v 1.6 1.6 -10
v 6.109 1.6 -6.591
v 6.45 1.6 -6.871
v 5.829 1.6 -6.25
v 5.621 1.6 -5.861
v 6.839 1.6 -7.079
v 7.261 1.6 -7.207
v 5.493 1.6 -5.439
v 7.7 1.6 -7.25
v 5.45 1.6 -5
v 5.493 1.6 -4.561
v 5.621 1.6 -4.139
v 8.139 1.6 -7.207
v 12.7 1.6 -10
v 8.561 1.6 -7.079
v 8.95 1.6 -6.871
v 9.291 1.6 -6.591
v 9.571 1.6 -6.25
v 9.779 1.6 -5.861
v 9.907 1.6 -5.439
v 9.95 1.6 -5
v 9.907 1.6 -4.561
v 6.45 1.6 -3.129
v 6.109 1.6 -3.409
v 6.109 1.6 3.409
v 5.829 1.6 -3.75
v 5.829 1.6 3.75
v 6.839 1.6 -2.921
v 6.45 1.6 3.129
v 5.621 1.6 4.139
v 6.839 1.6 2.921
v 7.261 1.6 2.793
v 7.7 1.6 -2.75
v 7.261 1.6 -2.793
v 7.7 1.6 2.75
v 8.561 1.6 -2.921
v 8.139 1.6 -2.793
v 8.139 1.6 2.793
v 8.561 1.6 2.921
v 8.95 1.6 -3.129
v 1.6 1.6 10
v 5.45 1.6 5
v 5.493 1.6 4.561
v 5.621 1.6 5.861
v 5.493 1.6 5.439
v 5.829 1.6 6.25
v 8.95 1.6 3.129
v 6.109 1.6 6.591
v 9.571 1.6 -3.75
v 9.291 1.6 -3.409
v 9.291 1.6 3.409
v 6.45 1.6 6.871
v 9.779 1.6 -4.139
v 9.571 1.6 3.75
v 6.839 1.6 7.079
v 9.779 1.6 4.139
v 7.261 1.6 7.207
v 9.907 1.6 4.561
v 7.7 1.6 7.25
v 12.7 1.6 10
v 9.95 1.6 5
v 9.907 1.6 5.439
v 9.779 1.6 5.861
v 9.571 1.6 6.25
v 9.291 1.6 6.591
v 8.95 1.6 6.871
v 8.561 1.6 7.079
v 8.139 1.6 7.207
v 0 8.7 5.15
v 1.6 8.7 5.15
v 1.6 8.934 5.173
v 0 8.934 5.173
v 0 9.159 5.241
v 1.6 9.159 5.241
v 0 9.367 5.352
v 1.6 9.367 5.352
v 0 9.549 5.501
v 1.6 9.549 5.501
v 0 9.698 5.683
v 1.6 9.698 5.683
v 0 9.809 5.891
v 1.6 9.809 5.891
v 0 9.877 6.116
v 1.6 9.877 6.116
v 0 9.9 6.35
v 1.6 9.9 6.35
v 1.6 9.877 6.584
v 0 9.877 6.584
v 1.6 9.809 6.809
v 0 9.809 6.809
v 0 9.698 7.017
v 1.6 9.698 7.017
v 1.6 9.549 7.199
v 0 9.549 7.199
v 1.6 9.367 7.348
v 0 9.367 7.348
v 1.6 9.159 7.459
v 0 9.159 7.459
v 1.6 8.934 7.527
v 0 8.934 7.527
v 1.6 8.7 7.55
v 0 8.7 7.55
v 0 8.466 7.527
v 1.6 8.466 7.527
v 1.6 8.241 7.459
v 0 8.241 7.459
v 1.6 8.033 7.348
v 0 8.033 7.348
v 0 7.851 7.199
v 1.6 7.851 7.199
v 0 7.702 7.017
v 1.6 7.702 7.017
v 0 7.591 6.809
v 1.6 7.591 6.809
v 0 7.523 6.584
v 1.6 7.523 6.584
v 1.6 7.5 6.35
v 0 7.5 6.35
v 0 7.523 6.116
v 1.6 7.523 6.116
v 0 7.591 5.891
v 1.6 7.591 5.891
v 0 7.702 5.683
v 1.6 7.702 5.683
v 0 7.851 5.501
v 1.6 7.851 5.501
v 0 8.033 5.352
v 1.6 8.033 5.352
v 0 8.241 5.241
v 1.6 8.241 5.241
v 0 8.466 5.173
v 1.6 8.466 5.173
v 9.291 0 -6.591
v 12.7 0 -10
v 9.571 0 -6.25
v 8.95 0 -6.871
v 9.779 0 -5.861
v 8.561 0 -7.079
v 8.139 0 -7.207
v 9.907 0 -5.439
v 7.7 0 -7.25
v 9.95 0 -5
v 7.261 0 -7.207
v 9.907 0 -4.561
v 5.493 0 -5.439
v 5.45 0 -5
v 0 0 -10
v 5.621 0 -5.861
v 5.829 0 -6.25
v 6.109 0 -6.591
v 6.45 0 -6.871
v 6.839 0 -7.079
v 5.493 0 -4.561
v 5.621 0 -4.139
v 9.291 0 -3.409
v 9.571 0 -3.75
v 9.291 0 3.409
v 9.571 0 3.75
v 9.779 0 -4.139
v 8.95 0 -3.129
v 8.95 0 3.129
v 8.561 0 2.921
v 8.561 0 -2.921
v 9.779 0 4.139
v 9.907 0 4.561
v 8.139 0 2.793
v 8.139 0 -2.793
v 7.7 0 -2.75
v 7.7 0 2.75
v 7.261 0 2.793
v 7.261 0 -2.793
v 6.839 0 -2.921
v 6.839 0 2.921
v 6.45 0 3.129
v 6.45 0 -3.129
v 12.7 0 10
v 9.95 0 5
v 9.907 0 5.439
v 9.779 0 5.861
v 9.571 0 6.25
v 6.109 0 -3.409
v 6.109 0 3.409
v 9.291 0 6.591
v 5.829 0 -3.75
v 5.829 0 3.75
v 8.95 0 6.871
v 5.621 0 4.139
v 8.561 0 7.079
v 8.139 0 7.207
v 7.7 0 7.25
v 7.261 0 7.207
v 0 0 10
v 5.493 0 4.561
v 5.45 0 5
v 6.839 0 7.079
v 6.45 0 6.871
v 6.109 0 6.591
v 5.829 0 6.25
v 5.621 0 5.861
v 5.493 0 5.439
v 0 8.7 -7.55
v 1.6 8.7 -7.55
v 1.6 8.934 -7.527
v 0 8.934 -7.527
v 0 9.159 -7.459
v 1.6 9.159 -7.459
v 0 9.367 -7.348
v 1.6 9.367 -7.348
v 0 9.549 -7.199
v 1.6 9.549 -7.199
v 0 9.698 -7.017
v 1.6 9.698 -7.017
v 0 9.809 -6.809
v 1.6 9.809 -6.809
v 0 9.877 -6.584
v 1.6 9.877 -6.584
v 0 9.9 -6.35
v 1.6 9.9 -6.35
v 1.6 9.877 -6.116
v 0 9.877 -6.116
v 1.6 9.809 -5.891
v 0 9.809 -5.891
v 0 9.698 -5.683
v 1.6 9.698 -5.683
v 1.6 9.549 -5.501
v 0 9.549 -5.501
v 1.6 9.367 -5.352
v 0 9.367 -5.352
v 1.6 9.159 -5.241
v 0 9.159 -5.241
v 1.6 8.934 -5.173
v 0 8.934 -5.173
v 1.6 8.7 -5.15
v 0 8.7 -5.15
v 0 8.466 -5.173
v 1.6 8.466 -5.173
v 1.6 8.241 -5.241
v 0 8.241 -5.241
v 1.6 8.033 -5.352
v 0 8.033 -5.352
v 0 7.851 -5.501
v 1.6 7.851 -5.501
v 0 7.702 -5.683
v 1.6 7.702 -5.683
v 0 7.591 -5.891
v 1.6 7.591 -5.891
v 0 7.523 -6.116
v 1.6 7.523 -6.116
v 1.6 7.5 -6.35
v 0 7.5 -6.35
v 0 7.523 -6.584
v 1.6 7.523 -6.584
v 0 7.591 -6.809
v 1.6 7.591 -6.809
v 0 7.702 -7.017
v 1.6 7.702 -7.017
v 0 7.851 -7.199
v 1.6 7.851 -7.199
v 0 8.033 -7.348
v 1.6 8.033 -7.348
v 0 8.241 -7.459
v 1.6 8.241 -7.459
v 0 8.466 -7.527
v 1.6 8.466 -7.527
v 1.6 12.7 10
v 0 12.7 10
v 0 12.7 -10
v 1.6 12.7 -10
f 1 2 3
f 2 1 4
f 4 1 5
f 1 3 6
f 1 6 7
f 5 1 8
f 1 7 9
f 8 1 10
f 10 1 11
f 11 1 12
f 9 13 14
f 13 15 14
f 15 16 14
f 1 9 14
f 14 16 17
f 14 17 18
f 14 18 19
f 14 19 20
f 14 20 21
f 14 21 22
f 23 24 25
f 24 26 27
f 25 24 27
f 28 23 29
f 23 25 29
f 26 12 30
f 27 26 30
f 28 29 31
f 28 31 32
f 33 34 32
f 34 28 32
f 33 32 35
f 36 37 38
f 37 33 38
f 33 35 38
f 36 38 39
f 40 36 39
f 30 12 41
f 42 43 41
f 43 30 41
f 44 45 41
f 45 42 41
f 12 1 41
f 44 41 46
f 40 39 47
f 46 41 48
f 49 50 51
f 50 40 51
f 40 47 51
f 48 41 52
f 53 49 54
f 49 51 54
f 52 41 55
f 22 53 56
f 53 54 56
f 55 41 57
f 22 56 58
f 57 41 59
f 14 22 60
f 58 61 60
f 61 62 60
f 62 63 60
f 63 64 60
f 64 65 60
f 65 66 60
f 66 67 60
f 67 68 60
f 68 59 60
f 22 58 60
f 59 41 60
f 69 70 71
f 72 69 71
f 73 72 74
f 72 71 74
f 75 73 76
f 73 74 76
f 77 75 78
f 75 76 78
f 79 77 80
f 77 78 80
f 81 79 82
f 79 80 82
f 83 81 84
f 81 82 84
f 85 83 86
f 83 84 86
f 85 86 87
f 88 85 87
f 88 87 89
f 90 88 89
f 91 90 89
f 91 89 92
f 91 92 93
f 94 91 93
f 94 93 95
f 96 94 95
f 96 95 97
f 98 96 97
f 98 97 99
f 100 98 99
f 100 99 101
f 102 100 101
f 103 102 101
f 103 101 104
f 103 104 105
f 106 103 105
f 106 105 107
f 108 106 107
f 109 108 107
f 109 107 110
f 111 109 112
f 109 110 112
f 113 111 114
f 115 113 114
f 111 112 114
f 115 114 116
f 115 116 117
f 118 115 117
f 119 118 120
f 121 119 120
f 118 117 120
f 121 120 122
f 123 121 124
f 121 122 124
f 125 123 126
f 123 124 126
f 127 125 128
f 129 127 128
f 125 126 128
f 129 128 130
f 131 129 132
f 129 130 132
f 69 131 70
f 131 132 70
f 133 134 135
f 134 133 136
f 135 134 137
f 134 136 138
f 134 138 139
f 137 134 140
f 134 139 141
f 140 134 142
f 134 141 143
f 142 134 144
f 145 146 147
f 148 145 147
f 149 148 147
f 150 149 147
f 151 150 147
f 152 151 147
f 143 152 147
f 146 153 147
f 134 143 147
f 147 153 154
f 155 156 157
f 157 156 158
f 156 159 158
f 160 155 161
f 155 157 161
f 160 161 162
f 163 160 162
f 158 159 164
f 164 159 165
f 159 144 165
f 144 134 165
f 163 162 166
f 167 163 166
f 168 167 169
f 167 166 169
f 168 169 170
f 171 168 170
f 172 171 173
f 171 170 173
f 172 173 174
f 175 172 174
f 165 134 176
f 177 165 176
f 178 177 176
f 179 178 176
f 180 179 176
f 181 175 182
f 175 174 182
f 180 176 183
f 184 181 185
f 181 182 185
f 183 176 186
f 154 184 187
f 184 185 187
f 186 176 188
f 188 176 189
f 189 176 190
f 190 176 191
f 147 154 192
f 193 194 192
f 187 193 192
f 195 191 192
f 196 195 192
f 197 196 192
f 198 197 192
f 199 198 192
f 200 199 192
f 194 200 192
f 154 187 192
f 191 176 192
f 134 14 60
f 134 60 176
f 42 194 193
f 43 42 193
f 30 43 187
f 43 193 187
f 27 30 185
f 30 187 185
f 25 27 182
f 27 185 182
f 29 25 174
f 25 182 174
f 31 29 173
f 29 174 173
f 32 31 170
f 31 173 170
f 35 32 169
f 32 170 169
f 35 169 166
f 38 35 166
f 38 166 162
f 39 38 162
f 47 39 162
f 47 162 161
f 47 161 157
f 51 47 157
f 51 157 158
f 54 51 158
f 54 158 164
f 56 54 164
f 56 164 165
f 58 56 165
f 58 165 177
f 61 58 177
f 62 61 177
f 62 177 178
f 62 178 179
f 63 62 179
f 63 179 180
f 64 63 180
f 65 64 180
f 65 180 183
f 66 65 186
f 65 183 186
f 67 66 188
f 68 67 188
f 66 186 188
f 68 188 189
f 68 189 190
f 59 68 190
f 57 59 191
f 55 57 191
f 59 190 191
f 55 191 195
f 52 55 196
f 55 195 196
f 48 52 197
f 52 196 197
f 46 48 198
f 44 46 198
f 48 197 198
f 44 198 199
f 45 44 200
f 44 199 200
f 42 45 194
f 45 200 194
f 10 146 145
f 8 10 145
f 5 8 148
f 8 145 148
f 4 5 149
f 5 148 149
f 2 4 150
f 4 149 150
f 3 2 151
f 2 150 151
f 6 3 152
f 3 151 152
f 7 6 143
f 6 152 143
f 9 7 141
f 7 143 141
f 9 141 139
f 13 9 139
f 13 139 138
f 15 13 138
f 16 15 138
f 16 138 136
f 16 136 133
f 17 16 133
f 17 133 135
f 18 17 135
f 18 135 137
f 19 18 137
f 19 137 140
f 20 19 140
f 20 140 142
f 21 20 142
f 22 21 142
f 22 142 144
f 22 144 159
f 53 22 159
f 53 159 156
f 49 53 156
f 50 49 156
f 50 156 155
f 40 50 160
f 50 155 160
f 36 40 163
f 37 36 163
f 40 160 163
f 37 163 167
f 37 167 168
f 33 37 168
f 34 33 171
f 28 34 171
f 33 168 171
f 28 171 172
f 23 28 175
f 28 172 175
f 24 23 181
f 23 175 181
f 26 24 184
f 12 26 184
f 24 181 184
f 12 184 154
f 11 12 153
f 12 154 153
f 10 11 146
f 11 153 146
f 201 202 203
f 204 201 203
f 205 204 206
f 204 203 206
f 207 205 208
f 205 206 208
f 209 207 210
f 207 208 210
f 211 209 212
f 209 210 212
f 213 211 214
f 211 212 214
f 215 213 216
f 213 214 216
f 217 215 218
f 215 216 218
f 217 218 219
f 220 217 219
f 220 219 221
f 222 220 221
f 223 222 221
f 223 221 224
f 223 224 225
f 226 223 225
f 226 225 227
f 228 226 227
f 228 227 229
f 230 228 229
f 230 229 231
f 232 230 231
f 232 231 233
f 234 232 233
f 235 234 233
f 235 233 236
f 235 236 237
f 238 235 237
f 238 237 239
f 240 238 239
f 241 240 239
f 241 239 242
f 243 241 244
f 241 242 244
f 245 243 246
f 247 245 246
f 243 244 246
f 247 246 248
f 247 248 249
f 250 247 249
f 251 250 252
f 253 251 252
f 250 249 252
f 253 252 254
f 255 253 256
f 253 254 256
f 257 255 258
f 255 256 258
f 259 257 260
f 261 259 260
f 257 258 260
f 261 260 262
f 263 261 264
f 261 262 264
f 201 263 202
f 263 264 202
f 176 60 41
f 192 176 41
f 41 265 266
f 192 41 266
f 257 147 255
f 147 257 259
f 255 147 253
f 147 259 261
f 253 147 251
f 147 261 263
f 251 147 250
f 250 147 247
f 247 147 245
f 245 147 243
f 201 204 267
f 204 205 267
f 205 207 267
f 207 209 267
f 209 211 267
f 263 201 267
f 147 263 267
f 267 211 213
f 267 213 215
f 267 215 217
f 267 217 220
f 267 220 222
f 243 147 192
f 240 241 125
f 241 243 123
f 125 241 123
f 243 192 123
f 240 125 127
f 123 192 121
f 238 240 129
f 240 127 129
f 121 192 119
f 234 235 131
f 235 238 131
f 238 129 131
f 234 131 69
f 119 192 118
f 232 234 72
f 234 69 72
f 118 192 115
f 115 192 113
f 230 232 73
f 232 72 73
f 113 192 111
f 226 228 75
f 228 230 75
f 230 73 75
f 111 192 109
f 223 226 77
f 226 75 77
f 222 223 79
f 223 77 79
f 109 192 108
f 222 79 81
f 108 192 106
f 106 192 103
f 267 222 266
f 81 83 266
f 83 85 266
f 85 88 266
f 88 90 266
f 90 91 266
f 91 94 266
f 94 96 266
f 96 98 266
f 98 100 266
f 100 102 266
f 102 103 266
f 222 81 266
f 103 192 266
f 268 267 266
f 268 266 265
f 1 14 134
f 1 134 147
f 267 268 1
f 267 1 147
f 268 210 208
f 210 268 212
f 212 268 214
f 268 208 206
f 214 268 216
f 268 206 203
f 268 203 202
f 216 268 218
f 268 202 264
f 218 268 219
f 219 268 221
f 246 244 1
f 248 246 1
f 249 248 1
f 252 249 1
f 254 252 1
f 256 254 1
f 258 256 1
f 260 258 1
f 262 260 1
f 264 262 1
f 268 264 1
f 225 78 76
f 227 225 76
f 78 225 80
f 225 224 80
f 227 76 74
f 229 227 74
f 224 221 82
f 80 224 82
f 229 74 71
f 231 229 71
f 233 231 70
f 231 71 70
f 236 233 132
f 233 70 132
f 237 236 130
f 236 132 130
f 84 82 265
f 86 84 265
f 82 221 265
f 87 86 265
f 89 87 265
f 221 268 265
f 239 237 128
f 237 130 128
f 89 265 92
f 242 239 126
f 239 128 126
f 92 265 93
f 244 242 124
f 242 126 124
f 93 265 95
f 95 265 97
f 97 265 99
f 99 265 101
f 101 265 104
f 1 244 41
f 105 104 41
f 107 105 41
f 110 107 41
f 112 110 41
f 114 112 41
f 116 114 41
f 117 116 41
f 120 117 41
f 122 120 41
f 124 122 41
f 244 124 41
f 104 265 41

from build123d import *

# Parameters (mm, degrees)
BOSS_EXTRUDE1_DEPTH  = 10
M4_CLEARANCE_HOLE1_D = 4.5
M2_CLEARANCE_HOLE1_D = 2.4


with BuildPart() as part:
    # Sketch1 → Boss-Extrude1 (new body, symmetric)
    with BuildSketch(Plane.XY):
        Polygon((0, 0), (0, 12.7), (1.6002, 12.7), (1.6002, 1.6002), (12.7, 1.6002), (12.7, 0), align=None)
    extrude(amount=BOSS_EXTRUDE1_DEPTH, both=True)

    # M4 Clearance Hole1 (through all)
    with Locations(Plane(origin=(0, 1.6002, 0), x_dir=(1, 0, 0), z_dir=(0, 1, 0))):
        with Locations((7.7, -5), (7.7, 5)):
            Hole(M4_CLEARANCE_HOLE1_D / 2)

    # M2 Clearance Hole1 (through all)
    with Locations(Plane.ZY):
        with Locations((-6.35, 8.7), (6.35, 8.7)):
            Hole(M2_CLEARANCE_HOLE1_D / 2)


solid = part.part
